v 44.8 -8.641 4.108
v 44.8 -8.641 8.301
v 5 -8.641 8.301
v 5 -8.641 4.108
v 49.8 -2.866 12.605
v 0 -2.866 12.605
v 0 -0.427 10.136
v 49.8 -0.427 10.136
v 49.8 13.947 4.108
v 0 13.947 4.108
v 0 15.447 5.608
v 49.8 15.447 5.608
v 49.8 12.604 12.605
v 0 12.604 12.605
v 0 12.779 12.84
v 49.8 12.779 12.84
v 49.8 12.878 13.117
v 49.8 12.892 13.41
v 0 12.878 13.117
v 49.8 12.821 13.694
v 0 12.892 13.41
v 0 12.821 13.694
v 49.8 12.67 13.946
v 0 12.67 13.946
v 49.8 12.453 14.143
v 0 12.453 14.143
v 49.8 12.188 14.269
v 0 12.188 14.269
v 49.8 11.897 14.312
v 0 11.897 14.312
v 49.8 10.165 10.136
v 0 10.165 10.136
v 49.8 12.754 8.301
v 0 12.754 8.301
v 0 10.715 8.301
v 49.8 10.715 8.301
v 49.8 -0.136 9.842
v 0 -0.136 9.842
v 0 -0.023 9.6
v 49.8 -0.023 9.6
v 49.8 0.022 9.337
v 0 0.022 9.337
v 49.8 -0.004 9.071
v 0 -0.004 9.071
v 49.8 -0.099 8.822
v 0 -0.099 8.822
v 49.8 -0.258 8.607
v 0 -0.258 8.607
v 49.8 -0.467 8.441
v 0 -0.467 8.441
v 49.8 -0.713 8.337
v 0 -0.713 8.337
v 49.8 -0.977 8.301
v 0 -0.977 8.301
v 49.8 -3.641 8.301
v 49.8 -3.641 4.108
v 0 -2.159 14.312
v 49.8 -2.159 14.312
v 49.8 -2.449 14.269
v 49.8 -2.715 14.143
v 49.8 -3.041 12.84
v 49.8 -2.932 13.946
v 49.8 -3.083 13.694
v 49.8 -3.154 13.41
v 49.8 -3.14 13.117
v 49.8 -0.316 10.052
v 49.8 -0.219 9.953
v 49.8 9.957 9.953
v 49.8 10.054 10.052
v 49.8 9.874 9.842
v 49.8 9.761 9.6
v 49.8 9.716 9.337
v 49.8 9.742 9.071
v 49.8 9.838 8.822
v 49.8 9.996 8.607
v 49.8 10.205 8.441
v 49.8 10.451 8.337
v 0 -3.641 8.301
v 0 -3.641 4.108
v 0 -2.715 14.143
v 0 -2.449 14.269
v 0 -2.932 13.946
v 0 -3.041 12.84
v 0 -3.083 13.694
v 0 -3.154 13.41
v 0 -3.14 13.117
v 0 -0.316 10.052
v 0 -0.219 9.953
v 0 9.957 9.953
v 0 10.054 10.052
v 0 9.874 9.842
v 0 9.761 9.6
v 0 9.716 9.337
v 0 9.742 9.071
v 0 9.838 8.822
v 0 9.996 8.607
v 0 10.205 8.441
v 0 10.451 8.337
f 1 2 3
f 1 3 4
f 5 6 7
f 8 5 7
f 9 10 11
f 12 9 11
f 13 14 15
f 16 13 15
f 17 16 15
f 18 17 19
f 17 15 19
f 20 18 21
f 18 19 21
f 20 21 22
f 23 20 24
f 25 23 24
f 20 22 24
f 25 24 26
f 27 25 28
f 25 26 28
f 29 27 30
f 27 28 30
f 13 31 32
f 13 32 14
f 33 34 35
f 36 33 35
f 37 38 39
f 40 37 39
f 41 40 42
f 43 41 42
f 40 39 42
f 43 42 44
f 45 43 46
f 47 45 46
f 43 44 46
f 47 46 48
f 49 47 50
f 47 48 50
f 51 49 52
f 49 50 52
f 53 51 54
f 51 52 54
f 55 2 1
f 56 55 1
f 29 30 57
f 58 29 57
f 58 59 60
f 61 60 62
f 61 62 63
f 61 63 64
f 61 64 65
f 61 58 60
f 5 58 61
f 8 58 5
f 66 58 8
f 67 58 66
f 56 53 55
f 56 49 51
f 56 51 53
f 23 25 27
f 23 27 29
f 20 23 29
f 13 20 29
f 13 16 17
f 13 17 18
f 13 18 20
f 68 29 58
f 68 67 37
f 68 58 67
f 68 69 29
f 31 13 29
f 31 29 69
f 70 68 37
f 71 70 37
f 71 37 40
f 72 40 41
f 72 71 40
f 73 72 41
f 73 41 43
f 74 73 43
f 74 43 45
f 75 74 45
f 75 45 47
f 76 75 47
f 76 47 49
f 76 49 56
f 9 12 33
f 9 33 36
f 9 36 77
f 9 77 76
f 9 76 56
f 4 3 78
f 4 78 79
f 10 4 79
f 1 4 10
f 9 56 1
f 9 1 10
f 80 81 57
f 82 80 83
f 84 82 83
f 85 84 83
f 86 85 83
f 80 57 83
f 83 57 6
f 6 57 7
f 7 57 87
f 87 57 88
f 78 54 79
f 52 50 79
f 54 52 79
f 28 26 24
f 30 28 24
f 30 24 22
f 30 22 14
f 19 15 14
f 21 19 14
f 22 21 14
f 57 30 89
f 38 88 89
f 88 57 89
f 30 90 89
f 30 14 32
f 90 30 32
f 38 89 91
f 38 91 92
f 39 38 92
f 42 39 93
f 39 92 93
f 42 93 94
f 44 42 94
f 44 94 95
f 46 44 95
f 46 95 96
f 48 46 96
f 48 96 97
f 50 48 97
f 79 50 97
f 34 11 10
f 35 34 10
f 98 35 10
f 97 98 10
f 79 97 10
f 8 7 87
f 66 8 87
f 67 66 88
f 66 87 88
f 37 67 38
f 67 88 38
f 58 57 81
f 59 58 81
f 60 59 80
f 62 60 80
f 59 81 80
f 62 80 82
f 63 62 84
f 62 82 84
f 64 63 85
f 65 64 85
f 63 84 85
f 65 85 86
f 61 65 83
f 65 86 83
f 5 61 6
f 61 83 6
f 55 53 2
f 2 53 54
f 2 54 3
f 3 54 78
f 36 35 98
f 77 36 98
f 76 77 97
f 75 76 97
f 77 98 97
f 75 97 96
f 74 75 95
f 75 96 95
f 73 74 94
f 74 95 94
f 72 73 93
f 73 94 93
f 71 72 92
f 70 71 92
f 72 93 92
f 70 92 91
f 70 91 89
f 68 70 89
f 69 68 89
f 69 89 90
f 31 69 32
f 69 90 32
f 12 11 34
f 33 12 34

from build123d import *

# Parameters (mm, degrees)
EXTRUDE_1_DEPTH     = 49.8
CHAMFER_1_SIZE      = 5
SKETCH_3_W          = 0.807071686
SKETCH_3_H          = 22.587877847
CUT_EXTRUDE_1_DEPTH = 49.8


with BuildPart() as part:
    # 草图1 → 凸台-拉伸1 (new body)
    with BuildSketch(Plane(origin=(0, 0, 0), x_dir=(0, 0, -1), z_dir=(1, 0, 0))):
        with BuildLine():
            Line((-3.30116432, 4.869061466), (-14.31163185, 4.869061466))
            Line((-14.31163185, 4.869061466), (-14.31163185, -2.159184752))
            ThreePointArc((-14.31163185, -2.159184752), (-13.694314645, -3.083064362), (-12.604524306, -2.866290096))
            Line((-12.604524306, -2.866290096), (-10.135977537, -0.42662706))
            ThreePointArc((-10.135977537, -0.42662706), (-10.00408666, -0.265887616), (-9.841806105, -0.13589764))
            ThreePointArc((-9.841806105, -0.13589764), (-8.821917683, -0.099462208), (-8.30116432, -0.977138612))
            Line((-8.30116432, -0.977138612), (-8.30116432, -3.015902523))
            Line((-8.30116432, -3.015902523), (-8.30116432, -8.640917782))
            Line((-8.30116432, -8.640917782), (-3.30116432, -8.640917782))
            Line((-3.30116432, -8.640917782), (-3.30116432, 4.869061466))
        make_face()
        with BuildLine():
            ThreePointArc((-8.30116432, 10.715261544), (-8.821917683, 9.83758514), (-9.841806105, 9.874020573))
            ThreePointArc((-9.841806105, 9.874020573), (-10.00408666, 10.004010548), (-10.135977537, 10.164749992))
            Line((-10.135977537, 10.164749992), (-12.604524306, 12.604413029))
            ThreePointArc((-12.604524306, 12.604413029), (-13.694314645, 12.821187294), (-14.31163185, 11.897307685))
            Line((-14.31163185, 11.897307685), (-14.31163185, 4.869061466))
            Line((-14.31163185, 4.869061466), (-3.30116432, 4.869061466))
            Line((-3.30116432, 4.869061466), (-3.30116432, 13.139889713))
            Line((-3.30116432, 13.139889713), (-5.608236006, 15.446957584))
            Line((-5.608236006, 15.446957584), (-8.30116432, 12.754025455))
            Line((-8.30116432, 12.754025455), (-8.30116432, 10.715261544))
        make_face()
    extrude(amount=EXTRUDE_1_DEPTH)

    # 倒角1
    chamfer_1_edges = [part.edges().sort_by_distance(p)[0] for p in [
        (0, -8.640917782, 5.80116432),
        (49.8, -8.640917782, 5.80116432),
    ]]
    chamfer(chamfer_1_edges, length=CHAMFER_1_SIZE)

    # 草图3 → 切除-拉伸1 (cut)
    with BuildSketch(Plane(origin=(49.8, 0, 0), x_dir=(0, 0, -1), z_dir=(1, 0, 0))):
        with Locations((-3.704700163, 2.653021142)):
            Rectangle(SKETCH_3_W, SKETCH_3_H)
    extrude(amount=-CUT_EXTRUDE_1_DEPTH, mode=Mode.SUBTRACT)


solid = part.part
